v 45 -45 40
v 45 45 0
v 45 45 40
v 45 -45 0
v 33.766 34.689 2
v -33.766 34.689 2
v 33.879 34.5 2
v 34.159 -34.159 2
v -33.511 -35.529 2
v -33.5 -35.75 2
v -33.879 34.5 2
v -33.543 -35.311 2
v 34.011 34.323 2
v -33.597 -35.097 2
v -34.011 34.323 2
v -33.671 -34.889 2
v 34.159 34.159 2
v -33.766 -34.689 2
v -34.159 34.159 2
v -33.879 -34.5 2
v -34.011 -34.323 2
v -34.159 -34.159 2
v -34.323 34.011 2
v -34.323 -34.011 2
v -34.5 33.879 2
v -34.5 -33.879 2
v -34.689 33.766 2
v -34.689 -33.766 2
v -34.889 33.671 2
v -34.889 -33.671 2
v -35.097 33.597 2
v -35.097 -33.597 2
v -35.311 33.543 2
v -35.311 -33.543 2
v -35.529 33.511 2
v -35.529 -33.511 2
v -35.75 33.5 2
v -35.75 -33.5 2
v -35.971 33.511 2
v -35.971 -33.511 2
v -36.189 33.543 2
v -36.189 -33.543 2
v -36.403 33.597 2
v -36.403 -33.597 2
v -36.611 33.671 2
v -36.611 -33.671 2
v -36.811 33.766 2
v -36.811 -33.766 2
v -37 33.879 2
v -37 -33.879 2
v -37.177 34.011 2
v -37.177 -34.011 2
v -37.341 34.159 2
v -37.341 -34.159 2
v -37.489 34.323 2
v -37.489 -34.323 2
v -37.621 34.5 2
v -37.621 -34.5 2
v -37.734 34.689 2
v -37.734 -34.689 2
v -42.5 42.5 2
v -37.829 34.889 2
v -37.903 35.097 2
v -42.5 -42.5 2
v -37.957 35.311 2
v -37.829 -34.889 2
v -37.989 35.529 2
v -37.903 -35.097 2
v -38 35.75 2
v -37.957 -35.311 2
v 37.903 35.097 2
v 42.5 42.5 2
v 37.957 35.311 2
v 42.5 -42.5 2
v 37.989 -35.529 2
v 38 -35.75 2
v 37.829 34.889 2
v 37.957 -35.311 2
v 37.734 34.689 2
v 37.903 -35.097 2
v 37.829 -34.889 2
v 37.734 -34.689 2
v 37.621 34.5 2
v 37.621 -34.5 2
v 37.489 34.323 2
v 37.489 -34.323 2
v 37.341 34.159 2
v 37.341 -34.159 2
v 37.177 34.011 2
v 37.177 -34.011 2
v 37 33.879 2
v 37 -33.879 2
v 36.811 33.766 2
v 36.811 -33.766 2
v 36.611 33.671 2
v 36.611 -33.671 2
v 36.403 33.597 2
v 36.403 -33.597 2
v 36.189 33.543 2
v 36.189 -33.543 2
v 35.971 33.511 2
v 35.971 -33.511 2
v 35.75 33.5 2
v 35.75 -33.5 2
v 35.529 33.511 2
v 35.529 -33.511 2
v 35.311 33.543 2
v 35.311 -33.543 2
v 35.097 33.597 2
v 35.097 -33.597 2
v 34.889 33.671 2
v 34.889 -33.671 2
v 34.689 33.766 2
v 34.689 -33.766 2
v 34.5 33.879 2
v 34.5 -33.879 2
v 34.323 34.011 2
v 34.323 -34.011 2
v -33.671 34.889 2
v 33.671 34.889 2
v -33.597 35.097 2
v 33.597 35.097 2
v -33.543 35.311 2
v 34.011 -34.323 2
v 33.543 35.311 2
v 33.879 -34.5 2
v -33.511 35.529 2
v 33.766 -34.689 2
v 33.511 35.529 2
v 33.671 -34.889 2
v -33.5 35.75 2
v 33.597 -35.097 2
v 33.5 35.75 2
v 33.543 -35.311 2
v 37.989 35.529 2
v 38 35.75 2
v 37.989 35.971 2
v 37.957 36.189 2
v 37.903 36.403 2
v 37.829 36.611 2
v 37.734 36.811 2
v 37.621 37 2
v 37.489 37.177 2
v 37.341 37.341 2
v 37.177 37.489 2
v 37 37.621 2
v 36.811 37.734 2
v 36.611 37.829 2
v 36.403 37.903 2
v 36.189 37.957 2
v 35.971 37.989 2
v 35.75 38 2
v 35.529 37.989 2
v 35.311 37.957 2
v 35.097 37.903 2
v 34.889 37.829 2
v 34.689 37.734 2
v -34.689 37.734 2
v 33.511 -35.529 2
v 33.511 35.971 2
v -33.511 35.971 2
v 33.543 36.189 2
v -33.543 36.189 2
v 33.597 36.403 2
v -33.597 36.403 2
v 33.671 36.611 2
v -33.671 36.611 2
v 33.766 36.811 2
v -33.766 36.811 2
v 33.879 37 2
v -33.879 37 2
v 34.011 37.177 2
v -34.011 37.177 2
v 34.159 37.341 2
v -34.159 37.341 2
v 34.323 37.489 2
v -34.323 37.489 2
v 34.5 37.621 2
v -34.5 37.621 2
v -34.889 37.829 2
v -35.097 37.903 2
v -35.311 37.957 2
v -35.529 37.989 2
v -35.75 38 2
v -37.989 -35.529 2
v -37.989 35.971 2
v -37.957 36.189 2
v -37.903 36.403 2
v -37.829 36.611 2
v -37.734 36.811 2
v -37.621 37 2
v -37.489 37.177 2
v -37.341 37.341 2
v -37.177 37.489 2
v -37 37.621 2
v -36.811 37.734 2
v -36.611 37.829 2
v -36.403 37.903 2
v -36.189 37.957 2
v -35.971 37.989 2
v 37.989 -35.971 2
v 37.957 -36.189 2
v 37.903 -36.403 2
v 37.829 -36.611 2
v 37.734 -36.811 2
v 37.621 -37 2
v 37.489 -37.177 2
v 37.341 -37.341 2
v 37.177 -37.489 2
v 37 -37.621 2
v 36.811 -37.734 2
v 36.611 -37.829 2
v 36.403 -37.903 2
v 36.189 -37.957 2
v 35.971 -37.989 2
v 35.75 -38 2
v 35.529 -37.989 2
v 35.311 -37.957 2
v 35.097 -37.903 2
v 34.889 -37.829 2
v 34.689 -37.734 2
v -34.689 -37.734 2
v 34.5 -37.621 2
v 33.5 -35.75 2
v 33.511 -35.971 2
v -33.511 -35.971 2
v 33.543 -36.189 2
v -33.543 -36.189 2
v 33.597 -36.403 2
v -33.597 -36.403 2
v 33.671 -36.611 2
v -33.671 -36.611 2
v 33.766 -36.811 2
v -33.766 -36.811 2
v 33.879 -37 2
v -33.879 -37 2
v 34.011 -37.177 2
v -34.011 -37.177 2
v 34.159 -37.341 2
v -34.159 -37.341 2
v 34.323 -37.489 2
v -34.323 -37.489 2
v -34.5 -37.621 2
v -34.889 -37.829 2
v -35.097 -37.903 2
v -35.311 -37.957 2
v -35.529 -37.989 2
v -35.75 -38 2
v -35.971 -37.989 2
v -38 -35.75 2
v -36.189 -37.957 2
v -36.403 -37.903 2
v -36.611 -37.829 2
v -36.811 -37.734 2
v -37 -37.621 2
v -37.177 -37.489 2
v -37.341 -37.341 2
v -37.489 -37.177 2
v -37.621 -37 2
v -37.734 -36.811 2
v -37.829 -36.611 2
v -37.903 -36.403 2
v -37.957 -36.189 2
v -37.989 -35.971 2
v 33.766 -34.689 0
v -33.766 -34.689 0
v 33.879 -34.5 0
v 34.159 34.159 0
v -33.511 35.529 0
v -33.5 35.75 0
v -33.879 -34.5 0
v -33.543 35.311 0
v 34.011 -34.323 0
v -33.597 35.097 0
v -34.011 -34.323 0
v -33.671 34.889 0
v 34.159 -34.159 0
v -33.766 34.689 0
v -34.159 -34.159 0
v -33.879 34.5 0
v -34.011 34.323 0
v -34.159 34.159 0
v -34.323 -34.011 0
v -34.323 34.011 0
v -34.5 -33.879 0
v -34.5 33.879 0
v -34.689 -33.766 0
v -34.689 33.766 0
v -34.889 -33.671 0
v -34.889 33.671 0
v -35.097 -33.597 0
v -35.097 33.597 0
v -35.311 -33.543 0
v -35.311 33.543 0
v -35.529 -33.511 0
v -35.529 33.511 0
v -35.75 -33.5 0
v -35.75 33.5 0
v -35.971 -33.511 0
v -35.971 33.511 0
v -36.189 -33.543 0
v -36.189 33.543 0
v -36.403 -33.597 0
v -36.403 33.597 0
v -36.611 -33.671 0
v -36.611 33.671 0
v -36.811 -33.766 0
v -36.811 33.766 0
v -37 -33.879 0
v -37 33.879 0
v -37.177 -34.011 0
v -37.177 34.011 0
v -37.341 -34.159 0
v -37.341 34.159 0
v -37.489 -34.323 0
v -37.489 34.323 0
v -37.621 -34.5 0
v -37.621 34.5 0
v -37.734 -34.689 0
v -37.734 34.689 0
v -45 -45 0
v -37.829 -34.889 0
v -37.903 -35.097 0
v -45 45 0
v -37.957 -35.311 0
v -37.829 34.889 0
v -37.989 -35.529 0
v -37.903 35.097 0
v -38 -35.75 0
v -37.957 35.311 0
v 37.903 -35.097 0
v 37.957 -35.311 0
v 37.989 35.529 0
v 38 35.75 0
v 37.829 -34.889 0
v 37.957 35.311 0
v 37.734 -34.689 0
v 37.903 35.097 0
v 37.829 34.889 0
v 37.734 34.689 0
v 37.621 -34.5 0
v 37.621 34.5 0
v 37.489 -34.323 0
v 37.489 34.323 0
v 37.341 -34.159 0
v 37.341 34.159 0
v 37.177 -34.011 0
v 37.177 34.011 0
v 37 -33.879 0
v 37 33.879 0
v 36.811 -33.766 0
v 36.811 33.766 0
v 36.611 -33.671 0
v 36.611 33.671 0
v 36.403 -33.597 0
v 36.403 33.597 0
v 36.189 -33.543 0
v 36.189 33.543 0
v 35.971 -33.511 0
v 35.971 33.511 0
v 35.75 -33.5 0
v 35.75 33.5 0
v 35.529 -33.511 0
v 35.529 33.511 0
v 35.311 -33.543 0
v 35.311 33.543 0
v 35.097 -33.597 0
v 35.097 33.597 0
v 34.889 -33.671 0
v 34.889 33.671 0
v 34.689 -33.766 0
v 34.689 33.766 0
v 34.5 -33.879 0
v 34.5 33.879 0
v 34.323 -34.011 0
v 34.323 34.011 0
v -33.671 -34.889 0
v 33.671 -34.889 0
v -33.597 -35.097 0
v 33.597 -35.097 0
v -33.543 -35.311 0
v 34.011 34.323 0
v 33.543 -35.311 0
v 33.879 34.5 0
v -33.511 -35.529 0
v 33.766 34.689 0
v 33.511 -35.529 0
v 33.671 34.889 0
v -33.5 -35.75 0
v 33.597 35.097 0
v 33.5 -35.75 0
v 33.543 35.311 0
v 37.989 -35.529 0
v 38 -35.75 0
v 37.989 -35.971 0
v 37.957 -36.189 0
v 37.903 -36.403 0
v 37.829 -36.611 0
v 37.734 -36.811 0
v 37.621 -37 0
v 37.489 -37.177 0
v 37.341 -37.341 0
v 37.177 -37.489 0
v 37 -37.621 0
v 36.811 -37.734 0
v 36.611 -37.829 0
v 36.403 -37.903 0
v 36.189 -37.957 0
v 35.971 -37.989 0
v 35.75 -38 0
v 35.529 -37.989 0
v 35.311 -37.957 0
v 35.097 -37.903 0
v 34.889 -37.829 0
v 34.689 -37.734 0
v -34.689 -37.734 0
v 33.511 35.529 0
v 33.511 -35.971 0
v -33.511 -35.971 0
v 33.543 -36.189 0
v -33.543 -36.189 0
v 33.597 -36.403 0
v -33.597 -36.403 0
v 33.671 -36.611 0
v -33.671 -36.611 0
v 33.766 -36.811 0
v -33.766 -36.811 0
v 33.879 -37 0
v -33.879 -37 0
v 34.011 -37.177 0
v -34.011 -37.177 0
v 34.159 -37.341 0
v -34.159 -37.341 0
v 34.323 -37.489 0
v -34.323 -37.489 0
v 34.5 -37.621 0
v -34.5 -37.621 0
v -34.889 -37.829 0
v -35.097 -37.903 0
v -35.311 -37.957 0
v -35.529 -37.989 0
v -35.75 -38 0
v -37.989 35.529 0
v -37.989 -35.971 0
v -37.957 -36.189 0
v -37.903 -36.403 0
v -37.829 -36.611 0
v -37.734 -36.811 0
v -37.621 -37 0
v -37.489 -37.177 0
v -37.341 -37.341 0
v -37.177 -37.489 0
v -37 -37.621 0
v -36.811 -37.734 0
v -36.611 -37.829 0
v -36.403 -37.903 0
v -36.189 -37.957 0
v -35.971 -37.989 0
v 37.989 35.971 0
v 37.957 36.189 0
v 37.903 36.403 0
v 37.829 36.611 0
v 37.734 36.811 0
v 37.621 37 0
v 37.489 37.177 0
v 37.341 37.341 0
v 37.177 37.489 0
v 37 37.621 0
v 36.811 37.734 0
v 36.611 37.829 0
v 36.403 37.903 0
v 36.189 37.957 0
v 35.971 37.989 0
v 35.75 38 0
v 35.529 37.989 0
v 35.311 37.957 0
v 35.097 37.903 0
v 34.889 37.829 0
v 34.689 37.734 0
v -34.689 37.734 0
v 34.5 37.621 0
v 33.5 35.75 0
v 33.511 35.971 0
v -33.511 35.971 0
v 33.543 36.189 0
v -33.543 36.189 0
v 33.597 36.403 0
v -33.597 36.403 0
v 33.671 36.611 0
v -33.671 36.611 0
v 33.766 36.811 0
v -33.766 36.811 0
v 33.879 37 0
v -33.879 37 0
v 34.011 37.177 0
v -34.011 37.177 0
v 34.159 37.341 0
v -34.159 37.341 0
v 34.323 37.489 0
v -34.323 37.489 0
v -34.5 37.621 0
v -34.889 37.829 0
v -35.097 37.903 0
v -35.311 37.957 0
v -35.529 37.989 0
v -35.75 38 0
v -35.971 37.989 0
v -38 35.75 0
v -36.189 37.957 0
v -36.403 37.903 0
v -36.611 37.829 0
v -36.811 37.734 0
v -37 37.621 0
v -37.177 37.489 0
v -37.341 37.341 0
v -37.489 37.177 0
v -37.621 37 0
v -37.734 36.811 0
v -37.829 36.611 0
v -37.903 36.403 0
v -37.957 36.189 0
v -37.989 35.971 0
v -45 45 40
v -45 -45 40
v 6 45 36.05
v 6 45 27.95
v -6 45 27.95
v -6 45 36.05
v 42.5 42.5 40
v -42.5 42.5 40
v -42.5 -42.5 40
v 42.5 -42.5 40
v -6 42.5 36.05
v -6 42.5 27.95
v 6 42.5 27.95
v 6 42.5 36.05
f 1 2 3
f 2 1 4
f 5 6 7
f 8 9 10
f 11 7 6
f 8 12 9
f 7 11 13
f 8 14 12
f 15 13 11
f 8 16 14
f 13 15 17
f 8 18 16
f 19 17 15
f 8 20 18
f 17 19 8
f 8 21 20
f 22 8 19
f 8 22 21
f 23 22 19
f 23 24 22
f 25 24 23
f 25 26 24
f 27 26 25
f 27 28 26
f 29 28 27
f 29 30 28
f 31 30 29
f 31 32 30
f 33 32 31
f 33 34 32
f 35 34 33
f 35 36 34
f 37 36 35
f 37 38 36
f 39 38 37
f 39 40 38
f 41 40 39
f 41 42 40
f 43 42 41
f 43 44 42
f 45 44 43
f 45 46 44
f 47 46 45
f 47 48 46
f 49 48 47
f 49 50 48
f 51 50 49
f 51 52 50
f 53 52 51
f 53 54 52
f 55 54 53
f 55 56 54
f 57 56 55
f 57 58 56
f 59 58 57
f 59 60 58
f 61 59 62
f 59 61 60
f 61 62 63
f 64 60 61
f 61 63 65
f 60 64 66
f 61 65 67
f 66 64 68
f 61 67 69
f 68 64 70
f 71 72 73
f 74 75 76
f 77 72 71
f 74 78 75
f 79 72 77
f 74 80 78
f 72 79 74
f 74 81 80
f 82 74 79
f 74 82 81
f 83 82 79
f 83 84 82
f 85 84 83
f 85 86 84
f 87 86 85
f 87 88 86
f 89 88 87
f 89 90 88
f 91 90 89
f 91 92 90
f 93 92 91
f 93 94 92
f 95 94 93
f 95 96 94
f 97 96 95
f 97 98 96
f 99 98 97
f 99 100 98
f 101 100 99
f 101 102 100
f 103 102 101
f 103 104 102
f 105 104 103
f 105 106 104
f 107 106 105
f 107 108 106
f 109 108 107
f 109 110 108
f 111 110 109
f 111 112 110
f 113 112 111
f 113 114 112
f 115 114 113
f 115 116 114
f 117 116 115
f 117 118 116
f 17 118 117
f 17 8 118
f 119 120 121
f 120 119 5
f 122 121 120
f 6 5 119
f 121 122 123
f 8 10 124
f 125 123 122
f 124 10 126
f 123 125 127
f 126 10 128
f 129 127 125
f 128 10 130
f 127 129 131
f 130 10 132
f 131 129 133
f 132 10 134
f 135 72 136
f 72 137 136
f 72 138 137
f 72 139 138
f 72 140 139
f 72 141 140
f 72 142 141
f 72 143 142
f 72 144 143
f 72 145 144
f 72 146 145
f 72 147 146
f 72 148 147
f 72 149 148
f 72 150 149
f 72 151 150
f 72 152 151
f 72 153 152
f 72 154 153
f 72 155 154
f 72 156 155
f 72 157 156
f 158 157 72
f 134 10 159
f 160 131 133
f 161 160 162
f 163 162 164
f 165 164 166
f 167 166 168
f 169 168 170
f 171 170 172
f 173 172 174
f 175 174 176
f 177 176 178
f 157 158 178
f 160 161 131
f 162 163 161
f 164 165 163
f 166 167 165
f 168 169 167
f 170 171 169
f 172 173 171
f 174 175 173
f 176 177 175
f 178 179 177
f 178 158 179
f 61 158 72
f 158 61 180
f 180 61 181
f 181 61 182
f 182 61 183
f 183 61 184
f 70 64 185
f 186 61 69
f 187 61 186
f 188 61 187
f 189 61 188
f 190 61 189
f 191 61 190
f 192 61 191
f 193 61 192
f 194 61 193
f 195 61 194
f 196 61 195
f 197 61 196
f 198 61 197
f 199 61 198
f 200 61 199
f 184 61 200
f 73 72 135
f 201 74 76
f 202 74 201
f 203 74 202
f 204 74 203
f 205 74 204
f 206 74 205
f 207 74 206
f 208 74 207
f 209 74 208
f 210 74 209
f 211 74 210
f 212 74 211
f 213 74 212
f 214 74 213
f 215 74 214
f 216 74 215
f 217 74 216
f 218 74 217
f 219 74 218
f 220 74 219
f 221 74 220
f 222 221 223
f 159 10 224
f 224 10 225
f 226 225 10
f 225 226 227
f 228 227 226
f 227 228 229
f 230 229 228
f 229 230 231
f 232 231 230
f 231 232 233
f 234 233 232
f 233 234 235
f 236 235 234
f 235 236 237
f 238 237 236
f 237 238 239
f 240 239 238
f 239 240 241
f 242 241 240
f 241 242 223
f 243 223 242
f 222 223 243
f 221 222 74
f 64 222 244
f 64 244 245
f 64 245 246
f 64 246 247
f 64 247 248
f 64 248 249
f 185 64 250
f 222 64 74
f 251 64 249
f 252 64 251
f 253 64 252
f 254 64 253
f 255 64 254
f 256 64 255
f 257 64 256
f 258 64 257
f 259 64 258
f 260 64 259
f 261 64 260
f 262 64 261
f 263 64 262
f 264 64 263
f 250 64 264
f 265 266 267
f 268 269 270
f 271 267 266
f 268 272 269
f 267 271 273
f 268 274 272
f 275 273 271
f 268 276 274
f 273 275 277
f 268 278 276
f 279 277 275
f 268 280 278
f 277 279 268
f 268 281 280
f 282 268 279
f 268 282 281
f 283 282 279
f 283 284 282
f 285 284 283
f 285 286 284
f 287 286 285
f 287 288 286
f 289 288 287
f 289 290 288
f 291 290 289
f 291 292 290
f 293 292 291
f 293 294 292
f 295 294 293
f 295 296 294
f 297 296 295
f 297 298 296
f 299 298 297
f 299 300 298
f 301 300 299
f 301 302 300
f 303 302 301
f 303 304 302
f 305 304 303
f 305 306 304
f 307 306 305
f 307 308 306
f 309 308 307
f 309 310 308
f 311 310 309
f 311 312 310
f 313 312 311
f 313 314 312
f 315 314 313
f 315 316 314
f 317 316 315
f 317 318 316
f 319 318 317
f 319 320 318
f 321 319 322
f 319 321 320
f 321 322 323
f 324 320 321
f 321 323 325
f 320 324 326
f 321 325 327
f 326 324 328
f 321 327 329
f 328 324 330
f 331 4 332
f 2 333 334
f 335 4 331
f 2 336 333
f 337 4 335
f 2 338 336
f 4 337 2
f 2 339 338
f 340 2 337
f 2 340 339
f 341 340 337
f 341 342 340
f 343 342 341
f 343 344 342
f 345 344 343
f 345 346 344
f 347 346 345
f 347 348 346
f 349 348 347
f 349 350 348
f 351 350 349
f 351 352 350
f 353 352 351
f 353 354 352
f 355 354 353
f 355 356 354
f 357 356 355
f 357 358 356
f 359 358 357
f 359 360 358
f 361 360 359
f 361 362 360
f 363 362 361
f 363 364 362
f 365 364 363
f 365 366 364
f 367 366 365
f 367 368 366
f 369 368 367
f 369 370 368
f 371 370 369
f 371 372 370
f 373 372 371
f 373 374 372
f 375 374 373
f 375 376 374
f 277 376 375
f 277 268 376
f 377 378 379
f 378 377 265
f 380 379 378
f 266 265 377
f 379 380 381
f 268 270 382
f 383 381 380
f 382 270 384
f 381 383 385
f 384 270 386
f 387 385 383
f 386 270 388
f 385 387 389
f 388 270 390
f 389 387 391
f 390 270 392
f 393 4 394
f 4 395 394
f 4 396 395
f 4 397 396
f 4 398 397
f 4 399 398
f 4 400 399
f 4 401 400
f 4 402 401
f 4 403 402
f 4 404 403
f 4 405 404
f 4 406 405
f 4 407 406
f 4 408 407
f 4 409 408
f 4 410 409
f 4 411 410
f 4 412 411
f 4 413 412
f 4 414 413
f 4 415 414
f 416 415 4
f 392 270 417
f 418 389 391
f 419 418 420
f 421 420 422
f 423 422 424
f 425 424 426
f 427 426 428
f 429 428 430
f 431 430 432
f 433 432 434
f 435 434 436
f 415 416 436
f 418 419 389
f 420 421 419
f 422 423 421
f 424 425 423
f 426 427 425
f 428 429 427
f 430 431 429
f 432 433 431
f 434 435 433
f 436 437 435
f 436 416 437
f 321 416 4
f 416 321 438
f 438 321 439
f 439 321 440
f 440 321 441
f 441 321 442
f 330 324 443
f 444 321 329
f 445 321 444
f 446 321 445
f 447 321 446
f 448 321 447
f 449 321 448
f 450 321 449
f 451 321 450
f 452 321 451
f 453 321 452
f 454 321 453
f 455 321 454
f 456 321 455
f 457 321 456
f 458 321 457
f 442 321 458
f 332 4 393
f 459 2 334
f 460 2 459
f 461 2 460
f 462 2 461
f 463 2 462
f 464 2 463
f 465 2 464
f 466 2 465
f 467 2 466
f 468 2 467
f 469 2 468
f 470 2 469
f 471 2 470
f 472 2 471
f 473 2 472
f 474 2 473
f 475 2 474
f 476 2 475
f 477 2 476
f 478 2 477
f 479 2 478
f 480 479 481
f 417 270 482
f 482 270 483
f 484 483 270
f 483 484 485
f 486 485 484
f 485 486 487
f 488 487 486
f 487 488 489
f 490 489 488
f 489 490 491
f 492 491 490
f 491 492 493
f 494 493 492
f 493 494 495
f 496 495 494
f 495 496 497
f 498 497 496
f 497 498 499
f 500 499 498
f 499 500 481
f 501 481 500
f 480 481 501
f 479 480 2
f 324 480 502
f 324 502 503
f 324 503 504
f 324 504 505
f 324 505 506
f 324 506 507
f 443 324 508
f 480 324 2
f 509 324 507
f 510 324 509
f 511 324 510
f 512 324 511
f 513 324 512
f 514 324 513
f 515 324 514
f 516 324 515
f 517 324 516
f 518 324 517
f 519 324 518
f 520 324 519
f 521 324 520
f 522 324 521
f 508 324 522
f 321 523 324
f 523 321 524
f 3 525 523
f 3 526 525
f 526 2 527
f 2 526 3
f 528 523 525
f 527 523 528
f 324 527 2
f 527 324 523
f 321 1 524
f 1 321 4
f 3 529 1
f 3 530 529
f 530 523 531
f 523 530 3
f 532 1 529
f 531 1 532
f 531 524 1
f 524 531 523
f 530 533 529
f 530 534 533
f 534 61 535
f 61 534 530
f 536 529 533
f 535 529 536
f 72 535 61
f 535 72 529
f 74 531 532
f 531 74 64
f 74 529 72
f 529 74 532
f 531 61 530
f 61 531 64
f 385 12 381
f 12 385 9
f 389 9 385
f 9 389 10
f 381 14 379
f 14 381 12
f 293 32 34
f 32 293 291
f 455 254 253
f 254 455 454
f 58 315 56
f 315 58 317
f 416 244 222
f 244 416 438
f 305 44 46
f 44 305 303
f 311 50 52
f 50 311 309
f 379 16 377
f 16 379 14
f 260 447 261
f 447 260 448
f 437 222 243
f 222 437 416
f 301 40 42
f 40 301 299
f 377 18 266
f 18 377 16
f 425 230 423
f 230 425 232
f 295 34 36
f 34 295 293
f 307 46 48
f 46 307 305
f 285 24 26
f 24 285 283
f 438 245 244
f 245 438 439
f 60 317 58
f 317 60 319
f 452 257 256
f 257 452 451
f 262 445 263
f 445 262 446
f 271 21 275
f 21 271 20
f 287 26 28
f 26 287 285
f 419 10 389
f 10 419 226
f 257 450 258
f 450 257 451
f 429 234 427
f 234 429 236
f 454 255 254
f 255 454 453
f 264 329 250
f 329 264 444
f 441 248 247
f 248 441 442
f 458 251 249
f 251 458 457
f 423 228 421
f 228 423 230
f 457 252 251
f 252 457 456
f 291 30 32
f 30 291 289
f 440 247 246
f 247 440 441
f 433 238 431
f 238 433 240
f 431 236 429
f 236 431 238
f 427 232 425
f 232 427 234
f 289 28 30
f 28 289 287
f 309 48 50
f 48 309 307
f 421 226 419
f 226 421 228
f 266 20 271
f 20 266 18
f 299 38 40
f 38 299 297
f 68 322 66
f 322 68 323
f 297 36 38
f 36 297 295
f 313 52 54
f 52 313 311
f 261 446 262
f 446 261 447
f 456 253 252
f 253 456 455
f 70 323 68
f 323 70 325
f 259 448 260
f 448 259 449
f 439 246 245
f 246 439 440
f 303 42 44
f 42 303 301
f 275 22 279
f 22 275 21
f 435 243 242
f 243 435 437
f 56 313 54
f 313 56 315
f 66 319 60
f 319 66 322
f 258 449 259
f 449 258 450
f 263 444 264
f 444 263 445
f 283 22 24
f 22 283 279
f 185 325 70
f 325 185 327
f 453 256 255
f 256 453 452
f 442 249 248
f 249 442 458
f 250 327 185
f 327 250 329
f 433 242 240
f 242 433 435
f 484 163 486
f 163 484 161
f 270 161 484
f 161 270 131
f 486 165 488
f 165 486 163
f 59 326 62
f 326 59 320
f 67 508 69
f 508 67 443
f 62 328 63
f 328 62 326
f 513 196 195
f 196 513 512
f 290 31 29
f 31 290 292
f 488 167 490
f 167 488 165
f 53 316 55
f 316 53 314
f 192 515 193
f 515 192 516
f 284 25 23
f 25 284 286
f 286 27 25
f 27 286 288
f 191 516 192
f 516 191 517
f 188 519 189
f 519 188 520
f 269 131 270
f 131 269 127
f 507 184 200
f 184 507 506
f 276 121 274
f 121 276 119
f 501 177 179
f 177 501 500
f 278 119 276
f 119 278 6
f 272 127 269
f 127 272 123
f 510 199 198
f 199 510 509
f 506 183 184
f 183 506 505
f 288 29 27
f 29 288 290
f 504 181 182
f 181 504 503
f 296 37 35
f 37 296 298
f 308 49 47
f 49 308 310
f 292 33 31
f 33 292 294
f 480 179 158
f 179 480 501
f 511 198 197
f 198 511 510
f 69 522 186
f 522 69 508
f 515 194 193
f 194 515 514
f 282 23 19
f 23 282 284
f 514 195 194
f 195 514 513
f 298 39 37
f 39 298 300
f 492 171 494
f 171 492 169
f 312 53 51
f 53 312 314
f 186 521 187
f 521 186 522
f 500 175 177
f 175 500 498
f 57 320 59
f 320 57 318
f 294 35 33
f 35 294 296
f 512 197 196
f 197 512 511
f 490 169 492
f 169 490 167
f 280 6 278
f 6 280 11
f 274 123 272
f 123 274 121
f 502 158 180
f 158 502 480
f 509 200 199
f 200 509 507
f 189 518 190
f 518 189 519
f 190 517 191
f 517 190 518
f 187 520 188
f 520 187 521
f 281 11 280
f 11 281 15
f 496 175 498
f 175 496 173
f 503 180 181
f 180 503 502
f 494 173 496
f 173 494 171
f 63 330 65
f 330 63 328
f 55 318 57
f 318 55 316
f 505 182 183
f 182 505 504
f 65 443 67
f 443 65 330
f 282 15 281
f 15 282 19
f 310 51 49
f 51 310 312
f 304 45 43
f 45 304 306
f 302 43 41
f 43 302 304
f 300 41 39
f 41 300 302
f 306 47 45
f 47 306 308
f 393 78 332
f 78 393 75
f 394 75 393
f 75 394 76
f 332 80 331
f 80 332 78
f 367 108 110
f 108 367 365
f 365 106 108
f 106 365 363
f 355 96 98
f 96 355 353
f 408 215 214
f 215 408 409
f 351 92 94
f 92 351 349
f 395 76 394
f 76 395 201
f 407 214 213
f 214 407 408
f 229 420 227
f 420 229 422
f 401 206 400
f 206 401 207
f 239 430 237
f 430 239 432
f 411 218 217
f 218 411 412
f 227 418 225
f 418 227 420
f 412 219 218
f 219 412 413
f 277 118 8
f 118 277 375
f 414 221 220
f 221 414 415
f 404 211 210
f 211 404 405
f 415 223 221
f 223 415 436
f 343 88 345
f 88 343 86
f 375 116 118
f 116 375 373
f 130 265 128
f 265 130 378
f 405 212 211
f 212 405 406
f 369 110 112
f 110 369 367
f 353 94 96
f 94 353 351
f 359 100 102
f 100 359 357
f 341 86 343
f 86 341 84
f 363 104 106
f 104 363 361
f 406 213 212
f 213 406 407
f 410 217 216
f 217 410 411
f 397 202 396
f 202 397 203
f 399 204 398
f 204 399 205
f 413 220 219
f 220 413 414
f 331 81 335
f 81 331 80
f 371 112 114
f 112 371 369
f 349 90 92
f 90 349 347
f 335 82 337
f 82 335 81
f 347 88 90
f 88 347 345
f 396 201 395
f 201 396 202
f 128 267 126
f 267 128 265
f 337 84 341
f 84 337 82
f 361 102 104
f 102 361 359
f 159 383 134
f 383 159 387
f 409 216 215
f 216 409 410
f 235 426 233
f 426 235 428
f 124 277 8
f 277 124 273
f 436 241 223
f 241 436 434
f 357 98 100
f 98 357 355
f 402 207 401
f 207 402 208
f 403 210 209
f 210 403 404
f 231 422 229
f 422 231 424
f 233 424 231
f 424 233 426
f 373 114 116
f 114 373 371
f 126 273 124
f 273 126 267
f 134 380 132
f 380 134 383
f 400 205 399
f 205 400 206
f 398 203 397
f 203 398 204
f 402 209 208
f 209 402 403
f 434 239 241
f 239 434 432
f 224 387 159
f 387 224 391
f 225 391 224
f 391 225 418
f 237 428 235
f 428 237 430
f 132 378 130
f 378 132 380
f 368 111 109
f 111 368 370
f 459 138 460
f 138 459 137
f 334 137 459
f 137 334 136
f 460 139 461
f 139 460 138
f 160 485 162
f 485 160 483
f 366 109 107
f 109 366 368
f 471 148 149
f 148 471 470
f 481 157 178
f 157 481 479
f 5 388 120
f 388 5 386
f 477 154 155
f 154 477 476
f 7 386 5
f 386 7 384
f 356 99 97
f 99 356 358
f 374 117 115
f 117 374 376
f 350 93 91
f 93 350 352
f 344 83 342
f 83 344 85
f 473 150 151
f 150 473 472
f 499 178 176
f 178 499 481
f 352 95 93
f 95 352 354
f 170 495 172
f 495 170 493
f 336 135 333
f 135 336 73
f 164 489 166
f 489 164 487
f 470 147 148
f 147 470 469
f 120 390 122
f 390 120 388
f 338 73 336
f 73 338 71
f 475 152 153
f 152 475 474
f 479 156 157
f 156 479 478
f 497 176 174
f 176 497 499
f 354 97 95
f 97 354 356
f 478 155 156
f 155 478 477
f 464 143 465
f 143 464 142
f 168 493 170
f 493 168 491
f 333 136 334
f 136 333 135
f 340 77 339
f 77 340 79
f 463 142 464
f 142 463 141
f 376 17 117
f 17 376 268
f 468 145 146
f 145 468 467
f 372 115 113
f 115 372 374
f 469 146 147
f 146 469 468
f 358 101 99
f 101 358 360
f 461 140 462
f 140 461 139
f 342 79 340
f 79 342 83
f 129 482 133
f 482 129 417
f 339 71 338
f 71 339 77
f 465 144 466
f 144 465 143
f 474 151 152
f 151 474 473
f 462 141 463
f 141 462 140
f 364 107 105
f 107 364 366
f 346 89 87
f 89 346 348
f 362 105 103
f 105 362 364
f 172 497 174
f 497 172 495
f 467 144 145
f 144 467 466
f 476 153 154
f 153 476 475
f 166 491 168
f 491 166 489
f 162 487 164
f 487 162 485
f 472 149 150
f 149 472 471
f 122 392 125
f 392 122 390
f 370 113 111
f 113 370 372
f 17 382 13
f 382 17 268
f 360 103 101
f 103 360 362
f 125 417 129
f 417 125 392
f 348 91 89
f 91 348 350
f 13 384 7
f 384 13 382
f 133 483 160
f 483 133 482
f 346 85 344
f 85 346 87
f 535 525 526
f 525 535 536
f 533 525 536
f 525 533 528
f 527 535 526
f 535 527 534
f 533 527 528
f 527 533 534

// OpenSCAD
// DIY Magnetic Stirrer Housing for 80mm PC Fan
// Designed for FDM 3D printing
// Print orientation: Upside down (top plate on bed)

// --- Dimensions (mm) ---
plate_thickness = 2;       // Thickness of the top plate (stirring surface)
wall_thickness = 2.5;      // Thickness of the side walls
box_outer_size = 90;       // Outer dimension of the box (X and Y)
box_height = 40;           // Height of the walls (from top plate to open edge)
hole_diameter = 4.5;       // Diameter for M4 screw holes
hole_pattern = 71.5;       // Center-to-center distance of the 4-hole square pattern
notch_width = 12;          // Width of the power cable notch
notch_depth = 8;           // Depth of the notch from the open edge (z=40 down to z=32)

// --- Derived Dimensions ---
hole_offset = hole_pattern / 2; // Distance from center to each hole
notch_z_start = box_height - notch_depth; // Z position where notch starts (32)
inner_size = box_outer_size - 2 * wall_thickness; // Inner dimension of the box (85mm)

// --- Main Structure ---
$fn = 64; // High resolution for smooth holes and curves

difference() {
    // Union of the box components
    union() {
        // Top Plate (rests on z=0 to z=plate_thickness)
        translate([-box_outer_size/2, -box_outer_size/2, 0])
            cube([box_outer_size, box_outer_size, plate_thickness]);

        // Four Walls (rise from top plate to z=box_height)
        // Front Wall (positive Y)
        translate([-box_outer_size/2, box_outer_size/2 - wall_thickness, plate_thickness])
            cube([box_outer_size, wall_thickness, box_height - plate_thickness]);

        // Back Wall (negative Y)
        translate([-box_outer_size/2, -box_outer_size/2, plate_thickness])
            cube([box_outer_size, wall_thickness, box_height - plate_thickness]);

        // Right Wall (positive X)
        translate([box_outer_size/2 - wall_thickness, -box_outer_size/2, plate_thickness])
            cube([wall_thickness, box_outer_size, box_height - plate_thickness]);

        // Left Wall (negative X)
        translate([-box_outer_size/2, -box_outer_size/2, plate_thickness])
            cube([wall_thickness, box_outer_size, box_height - plate_thickness]);
    }

    // --- Cutouts ---

    // 1. Four M4 Screw Holes in the Top Plate
    // Pattern is centered on the plate, 71.5mm square
    for (x = [-hole_offset, hole_offset]) {
        for (y = [-hole_offset, hole_offset]) {
            translate([x, y, -0.1]) // Extend slightly below z=0 to ensure clean cut
                cylinder(h = plate_thickness + 0.2, r = hole_diameter / 2, center = false);
        }
    }

    // 2. Power Cable Notch in One Wall
    // Cut in the "Front" wall (positive Y side)
    // Notch is 12mm wide, centered on the wall, from z=32 to z=40
    // The notch must only cut through the wall material, not the entire box width.
    // The wall is at Y = [box_outer_size/2 - wall_thickness, box_outer_size/2]
    // Center of the wall face is at Y = box_outer_size/2 - wall_thickness/2
    // We use a cube centered on the wall thickness to cut the notch.
    translate([0, box_outer_size/2 - wall_thickness/2, notch_z_start])
        cube([notch_width, wall_thickness + 0.1, notch_depth + 0.1], center = true);
}
